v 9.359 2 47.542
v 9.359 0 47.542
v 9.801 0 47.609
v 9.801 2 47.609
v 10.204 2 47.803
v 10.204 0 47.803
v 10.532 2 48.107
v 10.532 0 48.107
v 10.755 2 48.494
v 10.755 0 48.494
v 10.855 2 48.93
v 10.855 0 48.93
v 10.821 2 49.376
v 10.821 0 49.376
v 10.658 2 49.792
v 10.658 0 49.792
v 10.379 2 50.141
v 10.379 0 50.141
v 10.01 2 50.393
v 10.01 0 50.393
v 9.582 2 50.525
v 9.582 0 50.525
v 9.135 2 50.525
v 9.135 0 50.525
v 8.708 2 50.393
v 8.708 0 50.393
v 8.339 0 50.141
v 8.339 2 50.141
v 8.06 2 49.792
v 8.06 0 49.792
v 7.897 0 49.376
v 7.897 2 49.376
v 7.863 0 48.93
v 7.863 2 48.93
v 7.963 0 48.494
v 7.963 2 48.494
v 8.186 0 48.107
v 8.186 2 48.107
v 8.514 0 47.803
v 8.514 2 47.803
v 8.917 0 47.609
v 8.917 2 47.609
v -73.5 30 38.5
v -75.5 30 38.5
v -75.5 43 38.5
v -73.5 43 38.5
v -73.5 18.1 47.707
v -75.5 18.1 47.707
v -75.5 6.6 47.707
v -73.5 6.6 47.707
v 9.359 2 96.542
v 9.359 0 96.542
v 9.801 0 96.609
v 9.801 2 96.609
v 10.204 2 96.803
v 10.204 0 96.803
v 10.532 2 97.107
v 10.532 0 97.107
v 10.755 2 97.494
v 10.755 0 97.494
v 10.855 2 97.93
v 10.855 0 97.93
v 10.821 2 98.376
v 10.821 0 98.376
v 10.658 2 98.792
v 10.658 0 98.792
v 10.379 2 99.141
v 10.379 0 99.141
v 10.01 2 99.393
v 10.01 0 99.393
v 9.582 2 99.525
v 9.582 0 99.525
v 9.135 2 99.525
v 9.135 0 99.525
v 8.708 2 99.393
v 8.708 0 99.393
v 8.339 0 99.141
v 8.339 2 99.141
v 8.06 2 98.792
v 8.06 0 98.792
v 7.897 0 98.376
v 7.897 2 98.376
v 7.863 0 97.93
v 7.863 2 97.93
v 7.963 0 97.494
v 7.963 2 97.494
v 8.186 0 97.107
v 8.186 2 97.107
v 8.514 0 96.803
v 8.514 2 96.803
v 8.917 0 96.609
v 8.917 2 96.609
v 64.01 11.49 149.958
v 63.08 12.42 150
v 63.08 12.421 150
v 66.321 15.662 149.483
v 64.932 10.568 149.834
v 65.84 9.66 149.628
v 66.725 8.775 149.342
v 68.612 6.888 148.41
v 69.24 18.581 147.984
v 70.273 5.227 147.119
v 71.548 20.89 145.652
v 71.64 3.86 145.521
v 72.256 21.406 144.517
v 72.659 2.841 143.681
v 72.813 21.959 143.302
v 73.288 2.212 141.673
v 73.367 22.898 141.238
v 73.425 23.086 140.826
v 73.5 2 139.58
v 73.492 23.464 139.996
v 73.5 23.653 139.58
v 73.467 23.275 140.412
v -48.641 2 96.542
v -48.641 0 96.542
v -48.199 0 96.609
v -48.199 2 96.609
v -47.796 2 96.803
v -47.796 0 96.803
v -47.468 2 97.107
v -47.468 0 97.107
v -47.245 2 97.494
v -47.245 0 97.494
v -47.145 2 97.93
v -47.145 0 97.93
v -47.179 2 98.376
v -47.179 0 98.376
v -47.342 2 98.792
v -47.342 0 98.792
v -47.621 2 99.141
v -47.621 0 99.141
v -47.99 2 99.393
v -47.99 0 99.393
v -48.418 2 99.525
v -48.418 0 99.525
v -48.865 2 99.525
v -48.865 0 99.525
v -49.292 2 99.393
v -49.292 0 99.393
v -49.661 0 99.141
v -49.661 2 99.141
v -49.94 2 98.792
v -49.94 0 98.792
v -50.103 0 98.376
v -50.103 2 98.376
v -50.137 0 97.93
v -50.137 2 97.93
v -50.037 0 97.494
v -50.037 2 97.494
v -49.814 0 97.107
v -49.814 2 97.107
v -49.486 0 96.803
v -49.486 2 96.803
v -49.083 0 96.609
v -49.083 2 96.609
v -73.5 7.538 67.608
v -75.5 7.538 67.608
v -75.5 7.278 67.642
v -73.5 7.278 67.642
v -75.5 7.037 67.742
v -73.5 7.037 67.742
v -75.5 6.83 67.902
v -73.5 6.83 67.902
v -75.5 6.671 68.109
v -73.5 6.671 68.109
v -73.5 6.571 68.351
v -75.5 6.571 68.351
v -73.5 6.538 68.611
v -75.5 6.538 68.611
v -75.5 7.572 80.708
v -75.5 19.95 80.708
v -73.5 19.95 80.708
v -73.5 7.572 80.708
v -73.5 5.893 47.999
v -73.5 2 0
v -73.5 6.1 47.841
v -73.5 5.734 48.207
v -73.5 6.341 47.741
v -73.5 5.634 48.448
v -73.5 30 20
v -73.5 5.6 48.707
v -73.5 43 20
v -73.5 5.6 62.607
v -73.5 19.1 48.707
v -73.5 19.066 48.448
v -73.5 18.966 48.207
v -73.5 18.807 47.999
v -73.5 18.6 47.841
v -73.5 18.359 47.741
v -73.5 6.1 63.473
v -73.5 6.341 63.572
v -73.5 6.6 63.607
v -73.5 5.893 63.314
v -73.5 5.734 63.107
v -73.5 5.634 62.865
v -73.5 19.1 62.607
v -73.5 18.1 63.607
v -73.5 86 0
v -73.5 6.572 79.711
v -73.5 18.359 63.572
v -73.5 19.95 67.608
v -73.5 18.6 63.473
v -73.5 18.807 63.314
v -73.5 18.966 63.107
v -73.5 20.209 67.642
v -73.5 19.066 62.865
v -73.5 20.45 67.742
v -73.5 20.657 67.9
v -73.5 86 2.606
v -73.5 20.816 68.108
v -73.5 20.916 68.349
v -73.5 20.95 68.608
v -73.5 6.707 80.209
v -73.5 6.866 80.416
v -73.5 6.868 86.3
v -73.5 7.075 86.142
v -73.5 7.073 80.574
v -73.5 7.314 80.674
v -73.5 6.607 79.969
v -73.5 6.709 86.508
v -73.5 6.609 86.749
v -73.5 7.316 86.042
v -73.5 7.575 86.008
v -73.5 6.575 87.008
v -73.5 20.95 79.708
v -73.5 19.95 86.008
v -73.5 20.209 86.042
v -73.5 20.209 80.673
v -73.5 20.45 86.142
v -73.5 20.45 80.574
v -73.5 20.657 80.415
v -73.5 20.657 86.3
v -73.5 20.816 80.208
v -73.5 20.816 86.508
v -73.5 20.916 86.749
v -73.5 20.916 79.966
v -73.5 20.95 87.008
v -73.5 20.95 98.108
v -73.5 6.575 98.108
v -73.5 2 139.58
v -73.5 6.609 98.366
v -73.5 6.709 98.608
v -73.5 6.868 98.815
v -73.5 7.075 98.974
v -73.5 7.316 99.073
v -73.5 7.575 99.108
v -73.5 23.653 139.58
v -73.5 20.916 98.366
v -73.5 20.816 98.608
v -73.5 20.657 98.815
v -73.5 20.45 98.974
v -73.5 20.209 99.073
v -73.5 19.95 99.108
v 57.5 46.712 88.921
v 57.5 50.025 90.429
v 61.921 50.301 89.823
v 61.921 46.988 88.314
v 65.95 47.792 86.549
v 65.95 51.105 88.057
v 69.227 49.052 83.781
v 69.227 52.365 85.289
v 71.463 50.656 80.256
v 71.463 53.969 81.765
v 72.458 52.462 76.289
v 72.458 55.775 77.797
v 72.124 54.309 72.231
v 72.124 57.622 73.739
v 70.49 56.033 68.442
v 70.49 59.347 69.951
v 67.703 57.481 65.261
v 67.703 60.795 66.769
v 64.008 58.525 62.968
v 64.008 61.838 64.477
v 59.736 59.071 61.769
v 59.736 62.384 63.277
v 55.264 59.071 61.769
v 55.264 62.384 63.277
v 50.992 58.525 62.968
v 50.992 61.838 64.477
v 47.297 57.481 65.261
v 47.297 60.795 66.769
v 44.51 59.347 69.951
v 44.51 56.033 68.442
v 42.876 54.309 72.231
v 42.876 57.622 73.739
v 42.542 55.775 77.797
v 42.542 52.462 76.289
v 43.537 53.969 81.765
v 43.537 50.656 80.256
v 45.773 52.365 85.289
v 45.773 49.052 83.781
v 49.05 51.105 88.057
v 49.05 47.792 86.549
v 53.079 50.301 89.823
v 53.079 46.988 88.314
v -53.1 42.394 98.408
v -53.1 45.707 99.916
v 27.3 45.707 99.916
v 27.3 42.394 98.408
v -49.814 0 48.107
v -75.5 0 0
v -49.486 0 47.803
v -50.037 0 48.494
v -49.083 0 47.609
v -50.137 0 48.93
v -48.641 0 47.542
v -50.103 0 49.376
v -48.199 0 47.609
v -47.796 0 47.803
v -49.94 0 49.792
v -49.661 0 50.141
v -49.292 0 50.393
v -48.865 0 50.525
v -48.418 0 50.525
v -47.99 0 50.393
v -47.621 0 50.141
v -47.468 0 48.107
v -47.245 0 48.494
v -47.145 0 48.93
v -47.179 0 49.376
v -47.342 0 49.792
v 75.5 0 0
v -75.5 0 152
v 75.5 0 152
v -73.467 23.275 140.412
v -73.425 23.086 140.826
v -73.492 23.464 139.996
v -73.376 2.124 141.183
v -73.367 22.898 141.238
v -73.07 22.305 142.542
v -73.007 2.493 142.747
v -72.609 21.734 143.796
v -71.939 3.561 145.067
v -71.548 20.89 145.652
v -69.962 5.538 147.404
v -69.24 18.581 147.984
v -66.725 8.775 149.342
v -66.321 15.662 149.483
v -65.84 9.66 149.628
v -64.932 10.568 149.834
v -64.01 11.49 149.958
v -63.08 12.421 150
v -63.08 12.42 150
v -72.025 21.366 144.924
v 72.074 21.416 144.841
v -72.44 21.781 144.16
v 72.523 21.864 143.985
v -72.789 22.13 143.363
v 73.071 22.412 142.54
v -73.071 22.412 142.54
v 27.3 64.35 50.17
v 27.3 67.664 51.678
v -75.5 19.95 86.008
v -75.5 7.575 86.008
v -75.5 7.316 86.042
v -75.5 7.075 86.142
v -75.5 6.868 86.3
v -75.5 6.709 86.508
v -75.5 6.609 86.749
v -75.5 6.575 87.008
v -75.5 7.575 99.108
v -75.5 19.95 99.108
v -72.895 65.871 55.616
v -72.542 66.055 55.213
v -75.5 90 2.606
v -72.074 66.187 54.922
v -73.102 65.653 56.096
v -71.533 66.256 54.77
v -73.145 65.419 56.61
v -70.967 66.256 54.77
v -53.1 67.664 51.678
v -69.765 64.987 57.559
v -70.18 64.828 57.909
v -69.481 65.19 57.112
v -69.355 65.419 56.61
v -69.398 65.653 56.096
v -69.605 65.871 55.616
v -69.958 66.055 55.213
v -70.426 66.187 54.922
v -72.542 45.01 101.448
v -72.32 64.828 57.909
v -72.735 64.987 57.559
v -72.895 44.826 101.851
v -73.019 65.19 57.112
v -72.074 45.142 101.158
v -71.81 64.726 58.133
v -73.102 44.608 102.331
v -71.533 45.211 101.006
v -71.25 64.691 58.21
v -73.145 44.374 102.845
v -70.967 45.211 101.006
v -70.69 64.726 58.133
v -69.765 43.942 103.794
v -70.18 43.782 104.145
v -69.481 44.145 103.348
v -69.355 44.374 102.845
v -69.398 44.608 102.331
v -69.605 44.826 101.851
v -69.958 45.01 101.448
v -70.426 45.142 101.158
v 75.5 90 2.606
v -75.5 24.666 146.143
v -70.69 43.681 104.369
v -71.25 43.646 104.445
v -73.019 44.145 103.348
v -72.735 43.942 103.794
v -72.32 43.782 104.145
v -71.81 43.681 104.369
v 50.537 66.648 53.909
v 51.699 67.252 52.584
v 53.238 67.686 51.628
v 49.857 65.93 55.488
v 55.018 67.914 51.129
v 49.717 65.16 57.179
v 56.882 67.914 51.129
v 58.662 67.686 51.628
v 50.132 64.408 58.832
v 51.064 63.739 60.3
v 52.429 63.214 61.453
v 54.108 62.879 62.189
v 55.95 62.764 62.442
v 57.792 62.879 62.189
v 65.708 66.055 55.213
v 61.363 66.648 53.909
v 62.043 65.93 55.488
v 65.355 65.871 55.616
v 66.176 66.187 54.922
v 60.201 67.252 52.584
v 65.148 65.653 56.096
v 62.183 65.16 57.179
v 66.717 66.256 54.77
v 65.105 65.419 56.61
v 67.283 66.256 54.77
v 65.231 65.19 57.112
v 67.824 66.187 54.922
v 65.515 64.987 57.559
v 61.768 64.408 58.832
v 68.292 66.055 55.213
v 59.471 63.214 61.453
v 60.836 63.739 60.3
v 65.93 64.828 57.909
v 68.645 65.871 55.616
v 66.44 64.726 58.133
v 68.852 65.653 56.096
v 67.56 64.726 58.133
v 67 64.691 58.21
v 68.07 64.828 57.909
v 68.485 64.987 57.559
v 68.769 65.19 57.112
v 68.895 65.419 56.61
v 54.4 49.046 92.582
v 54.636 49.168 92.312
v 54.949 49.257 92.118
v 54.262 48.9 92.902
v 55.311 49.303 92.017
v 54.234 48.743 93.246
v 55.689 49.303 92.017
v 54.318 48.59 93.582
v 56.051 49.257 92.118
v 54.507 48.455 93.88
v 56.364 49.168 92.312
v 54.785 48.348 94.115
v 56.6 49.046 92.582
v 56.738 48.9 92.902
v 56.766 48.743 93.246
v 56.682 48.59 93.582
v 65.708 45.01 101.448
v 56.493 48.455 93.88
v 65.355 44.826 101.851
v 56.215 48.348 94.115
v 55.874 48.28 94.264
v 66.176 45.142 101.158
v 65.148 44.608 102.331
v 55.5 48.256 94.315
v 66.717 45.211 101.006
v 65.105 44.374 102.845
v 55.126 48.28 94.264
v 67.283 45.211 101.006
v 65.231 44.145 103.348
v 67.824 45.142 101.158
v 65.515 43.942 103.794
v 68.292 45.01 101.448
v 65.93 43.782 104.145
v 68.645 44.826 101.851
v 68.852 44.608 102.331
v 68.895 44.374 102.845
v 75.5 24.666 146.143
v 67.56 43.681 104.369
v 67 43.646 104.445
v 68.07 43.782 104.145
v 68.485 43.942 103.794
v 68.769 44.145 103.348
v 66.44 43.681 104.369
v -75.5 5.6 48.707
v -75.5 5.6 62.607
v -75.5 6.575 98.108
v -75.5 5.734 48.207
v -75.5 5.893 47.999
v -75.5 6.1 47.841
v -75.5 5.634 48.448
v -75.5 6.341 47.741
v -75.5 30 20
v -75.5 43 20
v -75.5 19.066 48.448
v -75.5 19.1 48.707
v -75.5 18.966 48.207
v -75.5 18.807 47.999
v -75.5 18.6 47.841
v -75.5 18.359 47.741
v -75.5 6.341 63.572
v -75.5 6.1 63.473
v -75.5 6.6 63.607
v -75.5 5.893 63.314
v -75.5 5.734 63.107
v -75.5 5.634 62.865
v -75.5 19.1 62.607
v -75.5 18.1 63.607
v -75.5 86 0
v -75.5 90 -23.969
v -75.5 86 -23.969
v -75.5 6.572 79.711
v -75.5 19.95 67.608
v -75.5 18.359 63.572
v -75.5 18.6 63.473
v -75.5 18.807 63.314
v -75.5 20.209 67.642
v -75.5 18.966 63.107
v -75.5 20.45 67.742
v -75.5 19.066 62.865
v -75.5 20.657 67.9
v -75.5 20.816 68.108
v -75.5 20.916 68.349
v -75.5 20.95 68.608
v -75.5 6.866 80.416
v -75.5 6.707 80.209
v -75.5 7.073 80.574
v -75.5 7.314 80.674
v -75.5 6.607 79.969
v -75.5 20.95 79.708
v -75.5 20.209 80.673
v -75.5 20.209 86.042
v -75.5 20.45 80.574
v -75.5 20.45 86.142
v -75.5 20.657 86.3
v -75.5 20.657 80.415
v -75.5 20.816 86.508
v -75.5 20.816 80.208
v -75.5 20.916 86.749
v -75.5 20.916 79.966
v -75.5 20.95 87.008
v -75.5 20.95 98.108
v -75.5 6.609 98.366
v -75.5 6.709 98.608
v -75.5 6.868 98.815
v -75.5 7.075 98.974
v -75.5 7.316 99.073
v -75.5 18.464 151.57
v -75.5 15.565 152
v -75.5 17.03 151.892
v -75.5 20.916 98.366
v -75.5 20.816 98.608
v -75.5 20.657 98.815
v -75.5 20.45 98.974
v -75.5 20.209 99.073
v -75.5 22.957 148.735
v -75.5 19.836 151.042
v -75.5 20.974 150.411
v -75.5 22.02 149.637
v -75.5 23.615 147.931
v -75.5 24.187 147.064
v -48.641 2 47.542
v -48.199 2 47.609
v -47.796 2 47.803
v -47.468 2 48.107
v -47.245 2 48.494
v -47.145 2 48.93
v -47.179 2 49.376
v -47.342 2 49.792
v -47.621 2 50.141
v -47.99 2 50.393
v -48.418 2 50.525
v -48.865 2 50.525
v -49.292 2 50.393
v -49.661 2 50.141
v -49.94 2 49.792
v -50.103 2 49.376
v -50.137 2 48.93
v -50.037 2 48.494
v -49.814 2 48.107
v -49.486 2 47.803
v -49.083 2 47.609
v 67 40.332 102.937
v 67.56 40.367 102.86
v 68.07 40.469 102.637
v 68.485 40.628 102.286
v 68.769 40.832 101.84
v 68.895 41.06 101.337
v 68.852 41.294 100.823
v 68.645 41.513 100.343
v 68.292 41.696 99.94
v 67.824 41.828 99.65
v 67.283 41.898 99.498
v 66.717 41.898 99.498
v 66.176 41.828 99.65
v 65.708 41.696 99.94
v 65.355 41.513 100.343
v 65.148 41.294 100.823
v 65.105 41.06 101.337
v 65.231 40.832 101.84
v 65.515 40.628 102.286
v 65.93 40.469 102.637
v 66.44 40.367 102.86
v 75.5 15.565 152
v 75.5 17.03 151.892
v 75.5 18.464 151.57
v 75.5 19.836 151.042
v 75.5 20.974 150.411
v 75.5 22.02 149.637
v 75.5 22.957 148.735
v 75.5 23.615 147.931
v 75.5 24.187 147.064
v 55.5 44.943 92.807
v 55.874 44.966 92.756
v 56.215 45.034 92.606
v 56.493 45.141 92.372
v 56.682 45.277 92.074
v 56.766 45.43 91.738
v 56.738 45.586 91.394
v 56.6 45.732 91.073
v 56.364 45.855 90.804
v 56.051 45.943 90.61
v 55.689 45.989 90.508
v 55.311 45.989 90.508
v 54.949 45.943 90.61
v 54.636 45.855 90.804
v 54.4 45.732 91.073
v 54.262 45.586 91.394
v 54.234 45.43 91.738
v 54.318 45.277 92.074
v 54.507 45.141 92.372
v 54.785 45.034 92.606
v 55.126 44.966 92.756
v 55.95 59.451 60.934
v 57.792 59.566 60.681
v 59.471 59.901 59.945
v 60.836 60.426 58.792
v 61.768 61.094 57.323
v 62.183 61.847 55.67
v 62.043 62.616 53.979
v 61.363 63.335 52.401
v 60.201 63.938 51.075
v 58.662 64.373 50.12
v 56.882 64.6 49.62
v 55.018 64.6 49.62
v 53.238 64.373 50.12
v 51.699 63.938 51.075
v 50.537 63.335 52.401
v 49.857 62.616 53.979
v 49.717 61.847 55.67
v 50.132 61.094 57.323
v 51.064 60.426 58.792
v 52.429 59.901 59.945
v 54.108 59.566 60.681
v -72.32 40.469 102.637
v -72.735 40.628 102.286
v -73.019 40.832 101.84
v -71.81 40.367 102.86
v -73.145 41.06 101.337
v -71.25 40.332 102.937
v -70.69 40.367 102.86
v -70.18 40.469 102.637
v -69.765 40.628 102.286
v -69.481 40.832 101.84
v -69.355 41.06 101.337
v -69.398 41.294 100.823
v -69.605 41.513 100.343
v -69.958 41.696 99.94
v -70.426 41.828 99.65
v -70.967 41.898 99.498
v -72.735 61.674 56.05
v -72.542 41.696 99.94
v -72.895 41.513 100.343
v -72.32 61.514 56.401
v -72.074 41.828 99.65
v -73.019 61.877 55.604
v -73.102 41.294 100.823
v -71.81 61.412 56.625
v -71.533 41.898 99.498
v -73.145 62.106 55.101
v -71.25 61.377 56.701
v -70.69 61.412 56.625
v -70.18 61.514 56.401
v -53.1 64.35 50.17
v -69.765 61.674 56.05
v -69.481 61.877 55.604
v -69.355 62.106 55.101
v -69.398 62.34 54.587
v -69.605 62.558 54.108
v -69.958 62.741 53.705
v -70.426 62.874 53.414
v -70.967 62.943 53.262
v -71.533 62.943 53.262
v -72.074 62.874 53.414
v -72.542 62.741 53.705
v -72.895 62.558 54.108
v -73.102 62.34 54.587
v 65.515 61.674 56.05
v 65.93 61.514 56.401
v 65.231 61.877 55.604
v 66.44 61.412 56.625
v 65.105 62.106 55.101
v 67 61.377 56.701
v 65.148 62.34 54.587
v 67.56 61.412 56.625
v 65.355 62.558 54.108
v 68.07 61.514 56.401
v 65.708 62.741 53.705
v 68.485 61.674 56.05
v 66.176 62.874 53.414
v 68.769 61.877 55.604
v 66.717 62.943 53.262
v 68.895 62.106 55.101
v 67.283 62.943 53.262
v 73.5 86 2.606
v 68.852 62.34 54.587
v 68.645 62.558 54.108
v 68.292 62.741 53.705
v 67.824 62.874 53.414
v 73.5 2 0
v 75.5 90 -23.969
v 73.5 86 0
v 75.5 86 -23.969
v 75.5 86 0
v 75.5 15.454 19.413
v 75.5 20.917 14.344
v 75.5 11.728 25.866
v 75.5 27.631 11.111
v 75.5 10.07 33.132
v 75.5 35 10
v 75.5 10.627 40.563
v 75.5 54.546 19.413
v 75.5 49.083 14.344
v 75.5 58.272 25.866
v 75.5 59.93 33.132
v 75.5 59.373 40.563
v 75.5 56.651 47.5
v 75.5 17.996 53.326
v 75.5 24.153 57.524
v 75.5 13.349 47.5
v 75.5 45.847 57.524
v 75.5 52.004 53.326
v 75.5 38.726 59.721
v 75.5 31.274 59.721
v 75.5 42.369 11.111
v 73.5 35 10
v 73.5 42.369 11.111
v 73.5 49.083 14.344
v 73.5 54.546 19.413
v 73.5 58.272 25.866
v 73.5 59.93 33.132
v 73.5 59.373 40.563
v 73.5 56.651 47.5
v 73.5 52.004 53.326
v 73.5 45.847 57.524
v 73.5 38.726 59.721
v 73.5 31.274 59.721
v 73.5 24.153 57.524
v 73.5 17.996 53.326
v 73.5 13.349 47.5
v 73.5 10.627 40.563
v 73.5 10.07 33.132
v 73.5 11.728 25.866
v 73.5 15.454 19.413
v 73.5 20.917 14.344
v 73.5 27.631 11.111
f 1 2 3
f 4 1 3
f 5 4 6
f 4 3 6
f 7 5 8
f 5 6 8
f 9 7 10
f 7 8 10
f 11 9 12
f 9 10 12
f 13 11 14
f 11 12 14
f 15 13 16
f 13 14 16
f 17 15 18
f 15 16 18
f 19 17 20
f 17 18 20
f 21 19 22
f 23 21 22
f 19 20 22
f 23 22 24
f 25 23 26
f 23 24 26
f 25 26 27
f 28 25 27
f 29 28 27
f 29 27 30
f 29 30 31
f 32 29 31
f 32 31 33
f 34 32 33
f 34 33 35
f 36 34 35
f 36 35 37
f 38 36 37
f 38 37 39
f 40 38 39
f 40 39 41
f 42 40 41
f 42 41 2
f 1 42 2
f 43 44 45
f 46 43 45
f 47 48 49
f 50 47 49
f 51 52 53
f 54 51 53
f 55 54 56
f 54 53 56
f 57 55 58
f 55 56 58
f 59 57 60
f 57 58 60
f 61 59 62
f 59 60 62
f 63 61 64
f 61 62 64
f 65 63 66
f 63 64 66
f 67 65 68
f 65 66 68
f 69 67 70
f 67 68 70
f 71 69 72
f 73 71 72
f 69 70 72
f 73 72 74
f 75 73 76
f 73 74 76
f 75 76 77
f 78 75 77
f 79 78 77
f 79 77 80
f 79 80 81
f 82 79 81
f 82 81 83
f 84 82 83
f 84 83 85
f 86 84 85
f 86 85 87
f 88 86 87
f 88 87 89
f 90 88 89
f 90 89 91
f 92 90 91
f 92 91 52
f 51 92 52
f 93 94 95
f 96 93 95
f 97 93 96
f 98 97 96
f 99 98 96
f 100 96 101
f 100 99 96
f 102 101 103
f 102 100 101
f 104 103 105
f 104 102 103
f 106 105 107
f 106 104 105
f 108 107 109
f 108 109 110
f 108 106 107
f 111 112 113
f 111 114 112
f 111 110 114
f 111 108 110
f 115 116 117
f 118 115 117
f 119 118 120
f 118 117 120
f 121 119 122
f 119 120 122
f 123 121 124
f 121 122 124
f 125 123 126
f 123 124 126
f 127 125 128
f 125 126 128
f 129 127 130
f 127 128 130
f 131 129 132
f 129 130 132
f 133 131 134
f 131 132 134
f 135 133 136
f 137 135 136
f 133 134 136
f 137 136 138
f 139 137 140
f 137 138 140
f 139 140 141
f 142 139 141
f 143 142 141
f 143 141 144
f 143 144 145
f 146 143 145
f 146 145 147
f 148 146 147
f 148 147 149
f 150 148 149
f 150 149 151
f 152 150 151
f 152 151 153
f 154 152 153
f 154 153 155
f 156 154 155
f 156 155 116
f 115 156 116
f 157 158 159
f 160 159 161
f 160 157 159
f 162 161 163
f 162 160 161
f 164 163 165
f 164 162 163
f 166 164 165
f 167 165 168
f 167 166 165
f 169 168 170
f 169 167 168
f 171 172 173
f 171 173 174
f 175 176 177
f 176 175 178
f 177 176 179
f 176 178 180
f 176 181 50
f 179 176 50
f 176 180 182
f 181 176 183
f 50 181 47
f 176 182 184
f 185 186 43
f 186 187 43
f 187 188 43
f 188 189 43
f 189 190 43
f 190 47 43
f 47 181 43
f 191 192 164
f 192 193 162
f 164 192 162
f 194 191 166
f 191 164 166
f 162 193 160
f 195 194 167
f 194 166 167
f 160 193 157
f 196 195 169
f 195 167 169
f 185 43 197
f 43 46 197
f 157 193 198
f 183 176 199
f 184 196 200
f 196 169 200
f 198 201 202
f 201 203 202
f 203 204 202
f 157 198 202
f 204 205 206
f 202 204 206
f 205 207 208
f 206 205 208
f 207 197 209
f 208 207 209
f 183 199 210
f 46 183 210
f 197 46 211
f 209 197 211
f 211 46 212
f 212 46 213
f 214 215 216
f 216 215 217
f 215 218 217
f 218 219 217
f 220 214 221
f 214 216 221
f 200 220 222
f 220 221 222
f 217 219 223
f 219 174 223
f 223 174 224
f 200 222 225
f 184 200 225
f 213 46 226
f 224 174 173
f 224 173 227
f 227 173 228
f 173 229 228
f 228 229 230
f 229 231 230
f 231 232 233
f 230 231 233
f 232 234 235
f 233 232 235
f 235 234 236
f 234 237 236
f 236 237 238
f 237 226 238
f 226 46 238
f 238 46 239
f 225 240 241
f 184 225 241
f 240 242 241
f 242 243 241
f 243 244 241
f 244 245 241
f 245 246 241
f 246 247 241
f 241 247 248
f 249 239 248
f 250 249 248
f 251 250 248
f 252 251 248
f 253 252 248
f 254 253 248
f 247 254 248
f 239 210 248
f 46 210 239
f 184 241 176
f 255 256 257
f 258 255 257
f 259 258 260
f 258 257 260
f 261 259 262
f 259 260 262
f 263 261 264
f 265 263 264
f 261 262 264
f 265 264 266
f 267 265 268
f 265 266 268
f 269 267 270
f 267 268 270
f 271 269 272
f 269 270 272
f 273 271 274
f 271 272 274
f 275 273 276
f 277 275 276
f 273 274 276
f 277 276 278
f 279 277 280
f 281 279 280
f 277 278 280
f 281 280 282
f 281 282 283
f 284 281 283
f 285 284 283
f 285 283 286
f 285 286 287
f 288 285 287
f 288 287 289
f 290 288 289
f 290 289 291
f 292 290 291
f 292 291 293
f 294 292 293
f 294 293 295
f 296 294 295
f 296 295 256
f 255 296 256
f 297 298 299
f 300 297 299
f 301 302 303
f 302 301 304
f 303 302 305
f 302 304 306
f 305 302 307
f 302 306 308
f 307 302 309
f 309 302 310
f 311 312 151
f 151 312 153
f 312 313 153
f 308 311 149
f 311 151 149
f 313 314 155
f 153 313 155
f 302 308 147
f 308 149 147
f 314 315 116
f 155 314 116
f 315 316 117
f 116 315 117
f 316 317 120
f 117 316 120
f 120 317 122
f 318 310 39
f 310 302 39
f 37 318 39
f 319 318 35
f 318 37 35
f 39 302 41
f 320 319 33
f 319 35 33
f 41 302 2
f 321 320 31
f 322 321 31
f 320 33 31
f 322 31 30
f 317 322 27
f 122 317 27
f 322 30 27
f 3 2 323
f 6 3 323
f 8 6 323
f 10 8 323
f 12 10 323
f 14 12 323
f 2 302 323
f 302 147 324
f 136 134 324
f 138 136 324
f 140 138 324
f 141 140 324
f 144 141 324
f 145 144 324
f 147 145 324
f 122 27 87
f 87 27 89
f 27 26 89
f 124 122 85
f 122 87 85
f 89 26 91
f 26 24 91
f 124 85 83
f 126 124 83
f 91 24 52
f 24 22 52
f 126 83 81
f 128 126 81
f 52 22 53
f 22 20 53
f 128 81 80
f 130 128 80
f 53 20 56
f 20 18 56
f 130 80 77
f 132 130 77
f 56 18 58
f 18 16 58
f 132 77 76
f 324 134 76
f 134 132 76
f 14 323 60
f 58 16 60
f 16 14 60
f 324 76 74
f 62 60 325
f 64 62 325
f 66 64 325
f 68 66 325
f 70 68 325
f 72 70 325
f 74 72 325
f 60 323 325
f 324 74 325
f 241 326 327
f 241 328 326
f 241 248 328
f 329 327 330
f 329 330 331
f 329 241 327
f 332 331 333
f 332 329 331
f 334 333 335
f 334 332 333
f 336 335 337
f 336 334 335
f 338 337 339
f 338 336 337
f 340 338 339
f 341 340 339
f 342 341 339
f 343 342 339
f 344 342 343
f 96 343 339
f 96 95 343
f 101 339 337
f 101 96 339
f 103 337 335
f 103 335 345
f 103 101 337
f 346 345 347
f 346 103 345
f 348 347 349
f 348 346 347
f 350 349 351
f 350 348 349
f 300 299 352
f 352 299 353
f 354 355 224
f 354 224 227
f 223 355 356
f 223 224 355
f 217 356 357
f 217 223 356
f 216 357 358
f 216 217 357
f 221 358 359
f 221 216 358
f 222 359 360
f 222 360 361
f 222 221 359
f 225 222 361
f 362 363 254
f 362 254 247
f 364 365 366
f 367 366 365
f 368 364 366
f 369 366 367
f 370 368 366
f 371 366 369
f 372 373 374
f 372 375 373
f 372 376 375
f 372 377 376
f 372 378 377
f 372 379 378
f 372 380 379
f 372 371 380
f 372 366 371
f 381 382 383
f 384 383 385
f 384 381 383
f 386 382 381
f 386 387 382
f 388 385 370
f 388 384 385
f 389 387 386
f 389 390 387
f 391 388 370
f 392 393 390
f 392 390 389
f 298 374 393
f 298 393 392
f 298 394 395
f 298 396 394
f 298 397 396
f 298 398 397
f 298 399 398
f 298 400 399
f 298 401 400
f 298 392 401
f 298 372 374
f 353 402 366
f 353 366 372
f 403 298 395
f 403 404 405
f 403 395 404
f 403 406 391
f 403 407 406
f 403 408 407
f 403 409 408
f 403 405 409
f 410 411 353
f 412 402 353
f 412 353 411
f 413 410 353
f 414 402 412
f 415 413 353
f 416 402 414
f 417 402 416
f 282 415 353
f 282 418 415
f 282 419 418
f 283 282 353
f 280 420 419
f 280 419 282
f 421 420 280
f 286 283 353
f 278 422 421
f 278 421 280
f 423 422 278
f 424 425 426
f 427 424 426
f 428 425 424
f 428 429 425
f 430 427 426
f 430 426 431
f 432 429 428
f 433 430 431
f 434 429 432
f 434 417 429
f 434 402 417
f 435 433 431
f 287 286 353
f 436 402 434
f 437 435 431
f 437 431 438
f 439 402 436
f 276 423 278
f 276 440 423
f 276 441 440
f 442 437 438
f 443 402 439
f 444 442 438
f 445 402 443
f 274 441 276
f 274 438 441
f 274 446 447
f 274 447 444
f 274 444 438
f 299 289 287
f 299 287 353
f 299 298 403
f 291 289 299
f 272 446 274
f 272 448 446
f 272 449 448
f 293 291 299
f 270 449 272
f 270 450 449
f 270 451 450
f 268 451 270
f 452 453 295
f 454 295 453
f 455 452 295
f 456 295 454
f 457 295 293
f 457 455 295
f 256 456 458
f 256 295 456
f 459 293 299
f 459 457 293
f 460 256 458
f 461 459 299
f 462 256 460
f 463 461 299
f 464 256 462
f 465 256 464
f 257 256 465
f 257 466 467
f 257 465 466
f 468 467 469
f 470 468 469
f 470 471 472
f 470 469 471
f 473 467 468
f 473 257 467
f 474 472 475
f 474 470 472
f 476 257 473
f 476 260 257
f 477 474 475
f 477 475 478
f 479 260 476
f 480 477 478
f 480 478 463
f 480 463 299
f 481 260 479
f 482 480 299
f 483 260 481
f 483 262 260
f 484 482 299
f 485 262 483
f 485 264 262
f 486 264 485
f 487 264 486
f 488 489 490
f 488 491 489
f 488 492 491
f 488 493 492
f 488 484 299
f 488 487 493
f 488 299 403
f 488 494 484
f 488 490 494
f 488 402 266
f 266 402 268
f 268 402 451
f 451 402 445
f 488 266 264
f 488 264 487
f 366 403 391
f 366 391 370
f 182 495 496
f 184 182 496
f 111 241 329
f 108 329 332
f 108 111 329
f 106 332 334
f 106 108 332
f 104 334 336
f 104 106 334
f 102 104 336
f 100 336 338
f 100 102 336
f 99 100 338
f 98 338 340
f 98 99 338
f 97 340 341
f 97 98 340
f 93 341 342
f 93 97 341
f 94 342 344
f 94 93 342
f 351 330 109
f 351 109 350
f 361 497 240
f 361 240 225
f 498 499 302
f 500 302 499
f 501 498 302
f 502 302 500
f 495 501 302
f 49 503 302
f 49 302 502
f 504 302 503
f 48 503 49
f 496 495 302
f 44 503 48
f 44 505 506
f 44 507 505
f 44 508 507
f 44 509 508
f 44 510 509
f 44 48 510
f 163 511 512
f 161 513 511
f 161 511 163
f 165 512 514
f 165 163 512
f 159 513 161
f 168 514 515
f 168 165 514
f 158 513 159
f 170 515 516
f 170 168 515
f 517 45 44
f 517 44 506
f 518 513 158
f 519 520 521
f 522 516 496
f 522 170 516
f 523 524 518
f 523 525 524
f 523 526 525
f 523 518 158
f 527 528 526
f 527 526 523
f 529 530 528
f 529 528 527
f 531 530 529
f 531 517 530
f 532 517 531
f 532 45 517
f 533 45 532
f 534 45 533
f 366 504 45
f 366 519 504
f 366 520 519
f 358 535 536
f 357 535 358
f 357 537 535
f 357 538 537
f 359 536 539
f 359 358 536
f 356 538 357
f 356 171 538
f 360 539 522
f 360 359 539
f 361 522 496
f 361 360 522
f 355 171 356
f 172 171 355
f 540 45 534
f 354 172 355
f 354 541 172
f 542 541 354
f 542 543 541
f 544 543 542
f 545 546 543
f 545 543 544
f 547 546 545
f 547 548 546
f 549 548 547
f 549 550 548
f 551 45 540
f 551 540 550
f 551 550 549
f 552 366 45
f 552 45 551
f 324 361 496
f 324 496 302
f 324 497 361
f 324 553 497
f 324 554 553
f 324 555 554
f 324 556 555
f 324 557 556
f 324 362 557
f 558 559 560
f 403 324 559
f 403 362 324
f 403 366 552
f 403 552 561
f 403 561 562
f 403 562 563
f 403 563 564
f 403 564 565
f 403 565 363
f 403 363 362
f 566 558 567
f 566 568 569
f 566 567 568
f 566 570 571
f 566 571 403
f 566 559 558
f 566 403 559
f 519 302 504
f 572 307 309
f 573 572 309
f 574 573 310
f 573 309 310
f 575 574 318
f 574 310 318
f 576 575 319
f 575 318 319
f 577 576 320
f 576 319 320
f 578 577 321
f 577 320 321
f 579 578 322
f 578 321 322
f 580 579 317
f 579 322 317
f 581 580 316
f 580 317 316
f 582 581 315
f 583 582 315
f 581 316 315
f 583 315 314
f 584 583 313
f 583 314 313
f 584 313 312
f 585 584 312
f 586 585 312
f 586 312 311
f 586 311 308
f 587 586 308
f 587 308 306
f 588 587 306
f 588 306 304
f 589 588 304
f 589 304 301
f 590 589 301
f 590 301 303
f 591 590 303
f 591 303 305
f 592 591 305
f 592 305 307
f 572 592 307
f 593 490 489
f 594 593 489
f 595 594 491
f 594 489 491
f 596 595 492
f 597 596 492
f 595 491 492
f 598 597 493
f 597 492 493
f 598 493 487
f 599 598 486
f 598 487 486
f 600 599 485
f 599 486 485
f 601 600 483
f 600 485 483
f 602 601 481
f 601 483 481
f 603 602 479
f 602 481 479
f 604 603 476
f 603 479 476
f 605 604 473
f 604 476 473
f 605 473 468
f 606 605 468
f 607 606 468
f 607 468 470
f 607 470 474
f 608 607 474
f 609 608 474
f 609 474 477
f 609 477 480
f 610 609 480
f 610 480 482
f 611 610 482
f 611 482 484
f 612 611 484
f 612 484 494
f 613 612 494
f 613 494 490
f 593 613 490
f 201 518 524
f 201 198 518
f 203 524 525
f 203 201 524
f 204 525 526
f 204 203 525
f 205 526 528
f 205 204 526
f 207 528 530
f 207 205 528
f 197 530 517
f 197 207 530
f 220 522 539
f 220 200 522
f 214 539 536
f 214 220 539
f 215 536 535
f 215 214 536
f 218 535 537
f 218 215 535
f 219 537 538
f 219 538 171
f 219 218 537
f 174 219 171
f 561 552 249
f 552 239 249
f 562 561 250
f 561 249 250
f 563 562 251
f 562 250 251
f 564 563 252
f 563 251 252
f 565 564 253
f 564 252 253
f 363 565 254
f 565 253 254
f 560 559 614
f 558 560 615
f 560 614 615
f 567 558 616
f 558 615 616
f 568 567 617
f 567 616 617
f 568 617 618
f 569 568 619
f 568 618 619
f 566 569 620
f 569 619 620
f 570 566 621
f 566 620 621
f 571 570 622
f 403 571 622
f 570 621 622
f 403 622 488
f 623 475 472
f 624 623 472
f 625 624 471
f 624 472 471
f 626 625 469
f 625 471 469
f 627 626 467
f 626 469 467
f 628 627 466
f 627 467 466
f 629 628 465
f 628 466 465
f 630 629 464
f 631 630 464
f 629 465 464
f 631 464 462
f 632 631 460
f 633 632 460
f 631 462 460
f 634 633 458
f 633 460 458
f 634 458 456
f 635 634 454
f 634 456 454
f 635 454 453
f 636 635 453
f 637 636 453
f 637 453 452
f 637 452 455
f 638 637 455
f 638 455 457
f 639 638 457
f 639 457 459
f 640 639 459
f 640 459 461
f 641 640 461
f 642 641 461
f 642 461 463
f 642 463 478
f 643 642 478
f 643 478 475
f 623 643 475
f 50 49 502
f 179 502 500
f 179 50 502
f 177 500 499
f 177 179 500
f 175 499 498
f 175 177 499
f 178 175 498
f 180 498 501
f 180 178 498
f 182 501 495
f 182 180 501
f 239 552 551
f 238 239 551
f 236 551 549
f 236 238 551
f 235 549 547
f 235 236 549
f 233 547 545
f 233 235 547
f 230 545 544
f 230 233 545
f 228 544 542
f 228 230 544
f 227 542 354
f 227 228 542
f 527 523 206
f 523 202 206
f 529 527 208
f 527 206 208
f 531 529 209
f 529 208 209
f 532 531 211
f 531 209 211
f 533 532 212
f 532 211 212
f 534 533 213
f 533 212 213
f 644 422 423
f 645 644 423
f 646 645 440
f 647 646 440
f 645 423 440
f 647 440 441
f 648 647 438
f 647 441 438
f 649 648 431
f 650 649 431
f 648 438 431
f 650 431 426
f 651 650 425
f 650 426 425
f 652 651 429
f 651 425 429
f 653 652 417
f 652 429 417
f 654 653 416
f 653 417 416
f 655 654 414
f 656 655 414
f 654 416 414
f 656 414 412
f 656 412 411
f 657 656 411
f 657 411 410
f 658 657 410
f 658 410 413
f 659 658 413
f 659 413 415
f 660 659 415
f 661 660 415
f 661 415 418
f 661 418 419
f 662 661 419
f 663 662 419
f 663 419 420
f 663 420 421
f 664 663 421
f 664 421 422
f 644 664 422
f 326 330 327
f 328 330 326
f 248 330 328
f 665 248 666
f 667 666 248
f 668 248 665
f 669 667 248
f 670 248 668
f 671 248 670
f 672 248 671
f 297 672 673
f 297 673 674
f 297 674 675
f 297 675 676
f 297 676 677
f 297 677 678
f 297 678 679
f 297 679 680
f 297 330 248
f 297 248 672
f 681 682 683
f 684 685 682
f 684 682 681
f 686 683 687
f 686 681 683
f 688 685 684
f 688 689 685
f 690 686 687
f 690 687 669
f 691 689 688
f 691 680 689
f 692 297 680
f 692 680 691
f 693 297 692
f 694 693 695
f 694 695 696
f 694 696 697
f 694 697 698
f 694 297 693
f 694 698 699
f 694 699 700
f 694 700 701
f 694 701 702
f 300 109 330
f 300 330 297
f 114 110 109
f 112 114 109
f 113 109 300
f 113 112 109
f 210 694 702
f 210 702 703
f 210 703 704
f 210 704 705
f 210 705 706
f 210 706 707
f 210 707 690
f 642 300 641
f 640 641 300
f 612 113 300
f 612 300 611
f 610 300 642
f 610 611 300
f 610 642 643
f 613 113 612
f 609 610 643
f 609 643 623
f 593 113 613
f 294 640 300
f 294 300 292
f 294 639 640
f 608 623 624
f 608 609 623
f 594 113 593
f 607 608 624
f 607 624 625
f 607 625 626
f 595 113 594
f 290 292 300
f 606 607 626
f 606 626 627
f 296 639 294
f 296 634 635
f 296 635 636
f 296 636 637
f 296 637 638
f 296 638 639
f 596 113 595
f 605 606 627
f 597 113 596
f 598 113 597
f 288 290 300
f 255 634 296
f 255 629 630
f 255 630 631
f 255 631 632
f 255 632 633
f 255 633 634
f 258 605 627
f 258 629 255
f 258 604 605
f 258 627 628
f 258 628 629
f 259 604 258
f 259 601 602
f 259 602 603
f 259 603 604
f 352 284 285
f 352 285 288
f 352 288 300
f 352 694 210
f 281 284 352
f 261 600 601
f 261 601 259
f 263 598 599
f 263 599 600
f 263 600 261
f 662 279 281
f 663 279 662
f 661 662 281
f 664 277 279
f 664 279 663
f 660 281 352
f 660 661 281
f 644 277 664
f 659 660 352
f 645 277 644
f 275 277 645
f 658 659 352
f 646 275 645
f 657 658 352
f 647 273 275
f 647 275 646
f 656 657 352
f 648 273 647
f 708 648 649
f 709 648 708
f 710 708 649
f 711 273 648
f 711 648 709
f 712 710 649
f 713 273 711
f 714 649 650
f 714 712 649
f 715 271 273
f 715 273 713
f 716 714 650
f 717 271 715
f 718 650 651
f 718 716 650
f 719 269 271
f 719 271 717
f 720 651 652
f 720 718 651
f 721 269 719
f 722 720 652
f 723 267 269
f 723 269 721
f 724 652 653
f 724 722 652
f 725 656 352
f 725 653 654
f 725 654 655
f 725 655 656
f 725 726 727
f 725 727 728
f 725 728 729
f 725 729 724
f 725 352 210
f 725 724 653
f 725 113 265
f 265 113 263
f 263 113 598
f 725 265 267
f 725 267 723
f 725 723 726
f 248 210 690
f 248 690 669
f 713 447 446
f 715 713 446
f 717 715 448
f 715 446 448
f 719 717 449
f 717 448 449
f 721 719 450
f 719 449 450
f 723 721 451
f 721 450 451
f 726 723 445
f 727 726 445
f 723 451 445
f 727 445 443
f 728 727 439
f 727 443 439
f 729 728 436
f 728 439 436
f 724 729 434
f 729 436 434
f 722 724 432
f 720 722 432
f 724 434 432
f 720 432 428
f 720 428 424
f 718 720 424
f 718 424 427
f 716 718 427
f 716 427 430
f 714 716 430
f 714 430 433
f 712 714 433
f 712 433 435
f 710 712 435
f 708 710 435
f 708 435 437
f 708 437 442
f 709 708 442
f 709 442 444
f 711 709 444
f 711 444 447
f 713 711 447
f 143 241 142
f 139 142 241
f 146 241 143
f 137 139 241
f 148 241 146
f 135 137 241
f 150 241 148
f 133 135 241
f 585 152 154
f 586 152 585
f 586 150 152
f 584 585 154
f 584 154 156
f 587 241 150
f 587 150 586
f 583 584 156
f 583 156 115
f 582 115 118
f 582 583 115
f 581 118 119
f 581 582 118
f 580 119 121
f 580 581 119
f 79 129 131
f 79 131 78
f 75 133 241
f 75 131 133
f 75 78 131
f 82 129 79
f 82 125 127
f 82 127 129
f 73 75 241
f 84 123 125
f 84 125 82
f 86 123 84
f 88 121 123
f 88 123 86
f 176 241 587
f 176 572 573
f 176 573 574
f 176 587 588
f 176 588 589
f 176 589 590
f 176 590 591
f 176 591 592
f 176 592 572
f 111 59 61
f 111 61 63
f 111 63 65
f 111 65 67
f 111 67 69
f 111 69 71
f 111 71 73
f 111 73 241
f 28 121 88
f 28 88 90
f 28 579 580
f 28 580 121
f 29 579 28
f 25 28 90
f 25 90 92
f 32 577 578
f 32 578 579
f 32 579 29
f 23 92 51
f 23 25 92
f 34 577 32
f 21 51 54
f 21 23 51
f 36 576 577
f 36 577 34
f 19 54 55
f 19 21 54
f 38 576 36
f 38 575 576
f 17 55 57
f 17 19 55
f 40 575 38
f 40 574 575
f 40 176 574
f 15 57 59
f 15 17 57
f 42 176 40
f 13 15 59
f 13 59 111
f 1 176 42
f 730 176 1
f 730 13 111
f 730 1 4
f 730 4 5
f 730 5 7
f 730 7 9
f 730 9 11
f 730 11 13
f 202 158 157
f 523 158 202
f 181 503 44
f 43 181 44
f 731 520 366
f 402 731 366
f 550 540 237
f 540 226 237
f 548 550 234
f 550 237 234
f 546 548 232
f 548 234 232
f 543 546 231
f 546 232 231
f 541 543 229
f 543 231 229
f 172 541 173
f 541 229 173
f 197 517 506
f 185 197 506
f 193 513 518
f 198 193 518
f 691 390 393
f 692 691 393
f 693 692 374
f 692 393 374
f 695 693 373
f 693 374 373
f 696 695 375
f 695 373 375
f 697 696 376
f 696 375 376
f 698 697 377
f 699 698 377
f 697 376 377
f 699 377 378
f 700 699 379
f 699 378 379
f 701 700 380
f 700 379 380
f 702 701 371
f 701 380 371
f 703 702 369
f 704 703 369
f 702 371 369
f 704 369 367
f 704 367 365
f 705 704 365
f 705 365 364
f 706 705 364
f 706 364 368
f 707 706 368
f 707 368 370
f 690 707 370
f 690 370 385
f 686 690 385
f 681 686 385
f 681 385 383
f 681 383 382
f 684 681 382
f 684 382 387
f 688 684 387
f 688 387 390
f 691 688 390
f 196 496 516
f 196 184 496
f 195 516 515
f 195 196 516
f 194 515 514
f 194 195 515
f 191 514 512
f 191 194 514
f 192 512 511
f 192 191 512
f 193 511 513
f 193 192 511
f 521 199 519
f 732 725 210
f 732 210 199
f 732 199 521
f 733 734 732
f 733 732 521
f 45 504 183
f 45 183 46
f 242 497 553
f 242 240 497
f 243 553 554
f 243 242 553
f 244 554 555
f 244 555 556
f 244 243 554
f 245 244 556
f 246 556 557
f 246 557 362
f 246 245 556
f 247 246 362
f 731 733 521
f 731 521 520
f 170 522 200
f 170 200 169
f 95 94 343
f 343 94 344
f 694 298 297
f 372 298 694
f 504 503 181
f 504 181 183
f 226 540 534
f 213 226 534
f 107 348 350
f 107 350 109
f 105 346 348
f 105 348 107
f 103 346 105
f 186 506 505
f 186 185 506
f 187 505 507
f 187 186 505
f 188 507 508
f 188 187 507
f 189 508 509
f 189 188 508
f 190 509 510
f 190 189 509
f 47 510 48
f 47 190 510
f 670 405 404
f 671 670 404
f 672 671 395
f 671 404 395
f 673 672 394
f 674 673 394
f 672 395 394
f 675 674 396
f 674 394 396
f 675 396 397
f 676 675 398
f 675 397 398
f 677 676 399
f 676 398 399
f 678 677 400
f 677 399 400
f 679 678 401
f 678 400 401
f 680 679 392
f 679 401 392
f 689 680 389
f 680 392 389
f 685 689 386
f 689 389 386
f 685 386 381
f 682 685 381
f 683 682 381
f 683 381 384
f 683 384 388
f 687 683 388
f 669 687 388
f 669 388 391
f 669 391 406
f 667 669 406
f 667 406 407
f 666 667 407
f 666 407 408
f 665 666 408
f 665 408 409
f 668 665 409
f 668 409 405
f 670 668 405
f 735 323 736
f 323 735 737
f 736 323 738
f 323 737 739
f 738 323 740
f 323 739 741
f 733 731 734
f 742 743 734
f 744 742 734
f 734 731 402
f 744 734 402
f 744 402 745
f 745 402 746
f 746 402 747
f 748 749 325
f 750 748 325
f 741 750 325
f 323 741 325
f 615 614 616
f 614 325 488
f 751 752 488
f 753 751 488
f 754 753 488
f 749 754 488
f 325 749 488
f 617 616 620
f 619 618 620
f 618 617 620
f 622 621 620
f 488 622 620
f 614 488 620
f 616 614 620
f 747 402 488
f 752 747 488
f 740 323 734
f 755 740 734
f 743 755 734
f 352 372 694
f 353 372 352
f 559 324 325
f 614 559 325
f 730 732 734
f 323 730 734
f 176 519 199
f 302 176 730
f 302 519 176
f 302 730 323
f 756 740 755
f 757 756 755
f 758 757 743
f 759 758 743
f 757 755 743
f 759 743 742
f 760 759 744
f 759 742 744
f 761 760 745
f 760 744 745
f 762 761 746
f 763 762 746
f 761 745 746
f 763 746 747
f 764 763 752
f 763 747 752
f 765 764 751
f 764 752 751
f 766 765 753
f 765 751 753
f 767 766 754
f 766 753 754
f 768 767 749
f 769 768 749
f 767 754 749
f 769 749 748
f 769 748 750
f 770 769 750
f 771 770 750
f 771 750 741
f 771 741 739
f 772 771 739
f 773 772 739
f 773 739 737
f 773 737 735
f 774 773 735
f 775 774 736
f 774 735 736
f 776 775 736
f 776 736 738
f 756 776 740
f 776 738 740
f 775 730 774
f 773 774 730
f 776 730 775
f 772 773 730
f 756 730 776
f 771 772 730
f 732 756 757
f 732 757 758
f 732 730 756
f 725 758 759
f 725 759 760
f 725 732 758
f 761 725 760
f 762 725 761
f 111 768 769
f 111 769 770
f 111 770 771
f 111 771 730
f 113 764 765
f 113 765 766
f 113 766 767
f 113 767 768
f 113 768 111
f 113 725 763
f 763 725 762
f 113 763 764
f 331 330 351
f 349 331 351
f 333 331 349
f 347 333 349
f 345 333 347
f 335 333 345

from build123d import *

# Parameters (mm, degrees)
SKETCH2_W           = 151
SKETCH2_H           = 152
BOSS_EXTRUDE1_DEPTH = 2
EXTRUDE_THIN1_DEPTH = 20
BOSS_EXTRUDE3_START = 75.5
BOSS_EXTRUDE3_DEPTH = 151
BOSS_EXTRUDE4_DEPTH = 2
BOSS_EXTRUDE5_DEPTH = 2
SKETCH8_R           = 25
CUT_EXTRUDE1_DEPTH  = 2
SKETCH9_W           = 80.4
SKETCH9_H           = 53
CUT_EXTRUDE6_DEPTH  = 10
SKETCH10_R          = 6.25
CUT_EXTRUDE7_DEPTH  = 10
SKETCH11_R          = 15
CUT_EXTRUDE8_DEPTH  = 10
SKETCH12_R          = 1.9
SKETCH12_R_2        = 1.27
CUT_EXTRUDE9_DEPTH  = 10
FILLET2_R           = 10
SKETCH15_W          = 18.5
SKETCH15_H          = 13
CUT_EXTRUDE12_DEPTH = 10
CUT_EXTRUDE13_DEPTH = 10
FILLET5_R           = 1
FILLET6_R           = 1
FILLET7_R           = 1
FILLET8_R           = 1
FILLET9_R           = 1
FILLET10_R          = 1
FILLET11_R          = 1
FILLET12_R          = 1
FILLET13_R          = 1
FILLET14_R          = 1
FILLET15_R          = 1
FILLET16_R          = 1
SKETCH19_R          = 1.5
CUT_EXTRUDE14_DEPTH = 10
FILLET17_R          = 10
FILLET19_R          = 10.42


with BuildPart() as part:
    # Sketch2 → Boss-Extrude1 (new body)
    with BuildSketch(Plane(origin=(0, 0, 0), x_dir=(1, 0, 0), z_dir=(0, 1, 0))):
        with Locations((0, -76)):
            Rectangle(SKETCH2_W, SKETCH2_H)
    extrude(amount=BOSS_EXTRUDE1_DEPTH)

    # Sketch3 → Extrude-Thin1 (add)
    with BuildSketch(Plane(origin=(0, 2, 0), x_dir=(1, 0, 0), z_dir=(0, 1, 0))):
        Polygon((-75.5, 0), (-75.5, -152), (75.5, -152), (75.5, 0), (73.5, 0), (73.5, -150), (-73.5, -150), (-73.5, 0), align=None)
    extrude(amount=EXTRUDE_THIN1_DEPTH)

    # Sketch4 → Boss-Extrude3 (add)
    with BuildSketch(Plane(origin=(0, 0, 0), x_dir=(0, 0, -1), z_dir=(1, 0, 0)).offset(BOSS_EXTRUDE3_START)):
        Polygon((0, 86), (23.969061552, 86), (23.969061552, 90), (0, 90), (-2.606060606, 90), (-152, 22), (-143.212121212, 22), (-2.606060606, 86), align=None)
    extrude(amount=-BOSS_EXTRUDE3_DEPTH)

    # Sketch6 → Boss-Extrude4 (add)
    with BuildSketch(Plane(origin=(75.5, 0, 0), x_dir=(0, 0, -1), z_dir=(1, 0, 0))):
        Polygon((0, 22), (-143.212121212, 22), (-2.606060606, 86), (0, 86), align=None)
    extrude(amount=-BOSS_EXTRUDE4_DEPTH)

    # Sketch7 → Boss-Extrude5 (add)
    with BuildSketch(Plane.ZY.offset(75.5)):
        Polygon((0, 86), (0, 22), (143.212121212, 22), (2.606060606, 86), align=None)
    extrude(amount=-BOSS_EXTRUDE5_DEPTH)

    # Sketch8 → Cut-Extrude1 (cut)
    with BuildSketch(Plane(origin=(75.5, 0, 0), x_dir=(0, 0, -1), z_dir=(1, 0, 0))):
        with Locations((-35, 35)):
            Circle(SKETCH8_R)
    extrude(amount=-CUT_EXTRUDE1_DEPTH, mode=Mode.SUBTRACT)

    # Sketch9 → Cut-Extrude6 (cut)
    with BuildSketch(Plane(origin=(0, 75.536424885, 34.382096844), x_dir=(1, 0, 0), z_dir=(0, 0.9101513920874156, 0.41427580605357506))):
        with Locations((-12.9, -45.503721555)):
            Rectangle(SKETCH9_W, SKETCH9_H)
    extrude(amount=-CUT_EXTRUDE6_DEPTH, mode=Mode.SUBTRACT)

    # Sketch10 → Cut-Extrude7 (cut)
    with BuildSketch(Plane(origin=(0, 75.536424885, 34.382096844), x_dir=(1, 0, 0), z_dir=(0, 0.9101513920874156, 0.41427580605357506))):
        with Locations(Location((55.95, -24.579806444, 0), (0, 0, 270))):
            Circle(SKETCH10_R)
    extrude(amount=-CUT_EXTRUDE7_DEPTH, mode=Mode.SUBTRACT)

    # Sketch11 → Cut-Extrude8 (cut)
    with BuildSketch(Plane(origin=(0, 75.536424885, 34.382096844), x_dir=(1, 0, 0), z_dir=(0, 0.9101513920874156, 0.41427580605357506))):
        with Locations(Location((57.5, -46.579806444, 0), (0, 0, 270))):
            Circle(SKETCH11_R)
    extrude(amount=-CUT_EXTRUDE8_DEPTH, mode=Mode.SUBTRACT)

    # Sketch12 → Cut-Extrude9 (cut)
    with BuildSketch(Plane(origin=(0, 75.536424885, 34.382096844), x_dir=(1, 0, 0), z_dir=(0, 0.9101513920874156, 0.41427580605357506))):
        with Locations(Location((67, -24.279806444, 0), (0, 0, 270))):
            Circle(SKETCH12_R)
        with Locations(Location((67, -75.079806444, 0), (0, 0, 270))):
            Circle(SKETCH12_R)
        with Locations(Location((-71.25, -24.279806444, 0), (0, 0, 270))):
            Circle(SKETCH12_R)
        with Locations(Location((-71.25, -75.079806444, 0), (0, 0, 270))):
            Circle(SKETCH12_R)
        with Locations(Location((55.5, -64.579806444, 0), (0, 0, 270))):
            Circle(SKETCH12_R_2)
    extrude(amount=-CUT_EXTRUDE9_DEPTH, mode=Mode.SUBTRACT)

    # Fillet2
    fillet2_edges = [part.edges().sort_by_distance(p)[0] for p in [
        (0, 22, 152),
    ]]
    fillet(fillet2_edges, radius=FILLET2_R)

    # Sketch15 → Cut-Extrude12 (cut)
    with BuildSketch(Plane.ZY.offset(75.5)):
        with Locations((29.25, 36.5)):
            Rectangle(SKETCH15_W, SKETCH15_H)
    extrude(amount=-CUT_EXTRUDE12_DEPTH, mode=Mode.SUBTRACT)

    # Sketch18 → Cut-Extrude13 (cut)
    with BuildSketch(Plane.ZY.offset(75.5)):
        Polygon((48.006551759, 19.1), (47.706551759, 19.1), (47.706551759, 5.6), (63.606551759, 5.6), (63.606551759, 19.1), align=None)
        Polygon((80.107551094, 20.95), (80.707551094, 20.95), (80.707551094, 6.575), (67.607551094, 6.534667741), (67.607551094, 20.95), align=None)
        Polygon((98.507551094, 20.95), (99.107551094, 20.95), (99.107551094, 6.575), (86.007551094, 6.575), (86.007551094, 20.95), align=None)
    extrude(amount=-CUT_EXTRUDE13_DEPTH, mode=Mode.SUBTRACT)

    # Fillet5
    fillet5_edges = [part.edges().sort_by_distance(p)[0] for p in [
        (-74.5, 20.95, 99.107551094),
    ]]
    fillet(fillet5_edges, radius=FILLET5_R)

    # Fillet6
    fillet6_edges = [part.edges().sort_by_distance(p)[0] for p in [
        (-74.5, 20.95, 86.007551094),
    ]]
    fillet(fillet6_edges, radius=FILLET6_R)

    # Fillet7
    fillet7_edges = [part.edges().sort_by_distance(p)[0] for p in [
        (-74.5, 6.575, 86.007551094),
    ]]
    fillet(fillet7_edges, radius=FILLET7_R)

    # Fillet8
    fillet8_edges = [part.edges().sort_by_distance(p)[0] for p in [
        (-74.5, 6.575, 99.107551094),
    ]]
    fillet(fillet8_edges, radius=FILLET8_R)

    # Fillet9
    fillet9_edges = [part.edges().sort_by_distance(p)[0] for p in [
        (-74.5, 20.95, 80.707551094),
    ]]
    fillet(fillet9_edges, radius=FILLET9_R)

    # Fillet10
    fillet10_edges = [part.edges().sort_by_distance(p)[0] for p in [
        (-74.5, 6.534667741, 67.607551094),
    ]]
    fillet(fillet10_edges, radius=FILLET10_R)

    # Fillet11
    fillet11_edges = [part.edges().sort_by_distance(p)[0] for p in [
        (-74.5, 20.95, 67.607551094),
    ]]
    fillet(fillet11_edges, radius=FILLET11_R)

    # Fillet12
    fillet12_edges = [part.edges().sort_by_distance(p)[0] for p in [
        (-74.5, 6.575, 80.707551094),
    ]]
    fillet(fillet12_edges, radius=FILLET12_R)

    # Fillet13
    fillet13_edges = [part.edges().sort_by_distance(p)[0] for p in [
        (-74.5, 19.1, 63.606551759),
    ]]
    fillet(fillet13_edges, radius=FILLET13_R)

    # Fillet14
    fillet14_edges = [part.edges().sort_by_distance(p)[0] for p in [
        (-74.5, 19.1, 47.706551759),
    ]]
    fillet(fillet14_edges, radius=FILLET14_R)

    # Fillet15
    fillet15_edges = [part.edges().sort_by_distance(p)[0] for p in [
        (-74.5, 5.6, 47.706551759),
    ]]
    fillet(fillet15_edges, radius=FILLET15_R)

    # Fillet16
    fillet16_edges = [part.edges().sort_by_distance(p)[0] for p in [
        (-74.5, 5.6, 63.606551759),
    ]]
    fillet(fillet16_edges, radius=FILLET16_R)

    # Sketch19 → Cut-Extrude14 (cut)
    with BuildSketch(Plane.XZ):
        with Locations(Location((9.358907141, 98.041860309, 0), (0, 0, 270))):
            Circle(SKETCH19_R)
        with Locations(Location((-48.641092859, 98.041860309, 0), (0, 0, 270))):
            Circle(SKETCH19_R)
        with Locations(Location((-48.641092859, 49.041860309, 0), (0, 0, 270))):
            Circle(SKETCH19_R)
        with Locations(Location((9.358907141, 49.041860309, 0), (0, 0, 270))):
            Circle(SKETCH19_R)
    extrude(amount=-CUT_EXTRUDE14_DEPTH, mode=Mode.SUBTRACT)

    # Fillet17
    fillet17_edges = [part.edges().sort_by_distance(p)[0] for p in [
        (0, 22, 143.212121212),
    ]]
    fillet(fillet17_edges, radius=FILLET17_R)

    # Fillet19
    # the kernel refuses this fillet: 10.42 mm, written as the material it adds along each edge
    with BuildSketch(Plane(origin=(-73.5, -24.05, 150), x_dir=(0, 0, -1), z_dir=(0, 1, 0))) as fillet19_piece_1_section:
        with BuildLine():
            CenterArc((FILLET19_R, -FILLET19_R), FILLET19_R, 90, 90)
            Line((0, -FILLET19_R), (0, 0))
            Line((0, 0), (FILLET19_R, 0))
        make_face()
    fillet19_piece_1 = extrude(amount=72.1, mode=Mode.PRIVATE)
    fillet19_piece_1 = split(fillet19_piece_1, bisect_by=Plane(origin=(-73.5, 11.537299555, 166.198357039), z_dir=(0, -0.9101513920874158, -0.41427580605357495)), keep=Keep.TOP, mode=Mode.PRIVATE)
    fillet19_piece_1 = split(fillet19_piece_1, bisect_by=Plane(origin=(-73.5, 0, 150), z_dir=(0, 1, 0)), keep=Keep.TOP, mode=Mode.PRIVATE)
    with BuildSketch(Plane(origin=(-73.5, -24.05, 150), x_dir=(0, 0, -1), z_dir=(0, 1, 0))) as fillet19_piece_2_section:
        with BuildLine():
            CenterArc((FILLET19_R, -FILLET19_R), FILLET19_R, 90, 90)
            Line((0, -FILLET19_R), (0, 0))
            Line((0, 0), (FILLET19_R, 0))
        make_face()
    fillet19_piece_2 = extrude(amount=72.1, mode=Mode.PRIVATE)
    fillet19_piece_2 = fillet19_piece_2 & Plane(origin=(-73.5, 15.564541031, 142), x_dir=(0, 0, 1), z_dir=(1, 0, 0)) * Cylinder(10, 186, mode=Mode.PRIVATE)
    with BuildSketch(Plane(origin=(73.5, -24.05, 150), x_dir=(-1, 0, 0), z_dir=(0, 1, 0))) as fillet19_piece_3_section:
        with BuildLine():
            CenterArc((FILLET19_R, -FILLET19_R), FILLET19_R, 90, 90)
            Line((0, -FILLET19_R), (0, 0))
            Line((0, 0), (FILLET19_R, 0))
        make_face()
    fillet19_piece_3 = extrude(amount=72.1, mode=Mode.PRIVATE)
    fillet19_piece_3 = split(fillet19_piece_3, bisect_by=Plane(origin=(73.5, 11.537299555, 166.198357039), z_dir=(0, -0.9101513920874158, -0.41427580605357495)), keep=Keep.TOP, mode=Mode.PRIVATE)
    fillet19_piece_3 = split(fillet19_piece_3, bisect_by=Plane(origin=(73.5, 0, 150), z_dir=(0, 1, 0)), keep=Keep.TOP, mode=Mode.PRIVATE)
    with BuildSketch(Plane(origin=(73.5, -24.05, 150), x_dir=(-1, 0, 0), z_dir=(0, 1, 0))) as fillet19_piece_4_section:
        with BuildLine():
            CenterArc((FILLET19_R, -FILLET19_R), FILLET19_R, 90, 90)
            Line((0, -FILLET19_R), (0, 0))
            Line((0, 0), (FILLET19_R, 0))
        make_face()
    fillet19_piece_4 = extrude(amount=72.1, mode=Mode.PRIVATE)
    fillet19_piece_4 = fillet19_piece_4 & Plane(origin=(73.5, 15.564541031, 142), x_dir=(0, 0, 1), z_dir=(1, 0, 0)) * Cylinder(10, 186, mode=Mode.PRIVATE)
    with BuildSketch(Plane(origin=(99.55, 2, 150), x_dir=(0, 1, 0), z_dir=(-1, 0, 0))) as fillet19_piece_5_section:
        with BuildLine():
            CenterArc((FILLET19_R, FILLET19_R), FILLET19_R, 180, 90)
            Line((0, FILLET19_R), (0, 0))
            Line((0, 0), (FILLET19_R, 0))
        make_face()
    fillet19_piece_5 = extrude(amount=199.1, mode=Mode.PRIVATE)
    fillet19_piece_5 = split(fillet19_piece_5, bisect_by=Plane(origin=(-75.5, 2, 150), z_dir=(1, 0, 0)), keep=Keep.TOP, mode=Mode.PRIVATE)
    fillet19_piece_5 = split(fillet19_piece_5, bisect_by=Plane(origin=(75.5, 2, 150), z_dir=(-1, 0, 0)), keep=Keep.TOP, mode=Mode.PRIVATE)
    with BuildSketch(Plane(origin=(97.446755584, 22, 150), x_dir=(0, 0.055144349629415036, -0.9984783927075983), z_dir=(-1, 0, 0))) as fillet19_piece_6_section:
        with BuildLine():
            CenterArc((9.875933547, 10.138731334), FILLET19_R, 183.161141999, 73.496080828)
            Line((-0.528211305, 9.564127211), (-1.56862579, 9.506666798))
            Line((-1.56862579, 9.506666798), (-1.040414485, -0.057460412))
            Line((-1.040414485, -0.057460412), (0.057460412, -1.040414485))
            ThreePointArc((0.057460412, -1.040414485), (4.669499422, -0.785699017), (7.230776161, -1.013873133))
            Line((7.230776161, -1.013873133), (7.471245014, 0))
        make_face()
    fillet19_piece_6 = extrude(amount=194.893511169, mode=Mode.PRIVATE)
    fillet19_piece_6 = split(fillet19_piece_6, bisect_by=Plane(origin=(-75.5, 22, 150), z_dir=(1, 0, 0)), keep=Keep.TOP, mode=Mode.PRIVATE)
    fillet19_piece_6 = split(fillet19_piece_6, bisect_by=Plane(origin=(75.5, 22, 150), z_dir=(-1, 0, 0)), keep=Keep.TOP, mode=Mode.PRIVATE)
    fillet19_piece_6 = fillet19_piece_6 & Plane(origin=(97.446755584, 15.564541031, 142), x_dir=(0, 0, 1), z_dir=(1, 0, 0)) * Cylinder(10, 429, mode=Mode.PRIVATE)
    add([fillet19_piece_1, fillet19_piece_2, fillet19_piece_3, fillet19_piece_4, fillet19_piece_5, fillet19_piece_6])


solid = part.part
